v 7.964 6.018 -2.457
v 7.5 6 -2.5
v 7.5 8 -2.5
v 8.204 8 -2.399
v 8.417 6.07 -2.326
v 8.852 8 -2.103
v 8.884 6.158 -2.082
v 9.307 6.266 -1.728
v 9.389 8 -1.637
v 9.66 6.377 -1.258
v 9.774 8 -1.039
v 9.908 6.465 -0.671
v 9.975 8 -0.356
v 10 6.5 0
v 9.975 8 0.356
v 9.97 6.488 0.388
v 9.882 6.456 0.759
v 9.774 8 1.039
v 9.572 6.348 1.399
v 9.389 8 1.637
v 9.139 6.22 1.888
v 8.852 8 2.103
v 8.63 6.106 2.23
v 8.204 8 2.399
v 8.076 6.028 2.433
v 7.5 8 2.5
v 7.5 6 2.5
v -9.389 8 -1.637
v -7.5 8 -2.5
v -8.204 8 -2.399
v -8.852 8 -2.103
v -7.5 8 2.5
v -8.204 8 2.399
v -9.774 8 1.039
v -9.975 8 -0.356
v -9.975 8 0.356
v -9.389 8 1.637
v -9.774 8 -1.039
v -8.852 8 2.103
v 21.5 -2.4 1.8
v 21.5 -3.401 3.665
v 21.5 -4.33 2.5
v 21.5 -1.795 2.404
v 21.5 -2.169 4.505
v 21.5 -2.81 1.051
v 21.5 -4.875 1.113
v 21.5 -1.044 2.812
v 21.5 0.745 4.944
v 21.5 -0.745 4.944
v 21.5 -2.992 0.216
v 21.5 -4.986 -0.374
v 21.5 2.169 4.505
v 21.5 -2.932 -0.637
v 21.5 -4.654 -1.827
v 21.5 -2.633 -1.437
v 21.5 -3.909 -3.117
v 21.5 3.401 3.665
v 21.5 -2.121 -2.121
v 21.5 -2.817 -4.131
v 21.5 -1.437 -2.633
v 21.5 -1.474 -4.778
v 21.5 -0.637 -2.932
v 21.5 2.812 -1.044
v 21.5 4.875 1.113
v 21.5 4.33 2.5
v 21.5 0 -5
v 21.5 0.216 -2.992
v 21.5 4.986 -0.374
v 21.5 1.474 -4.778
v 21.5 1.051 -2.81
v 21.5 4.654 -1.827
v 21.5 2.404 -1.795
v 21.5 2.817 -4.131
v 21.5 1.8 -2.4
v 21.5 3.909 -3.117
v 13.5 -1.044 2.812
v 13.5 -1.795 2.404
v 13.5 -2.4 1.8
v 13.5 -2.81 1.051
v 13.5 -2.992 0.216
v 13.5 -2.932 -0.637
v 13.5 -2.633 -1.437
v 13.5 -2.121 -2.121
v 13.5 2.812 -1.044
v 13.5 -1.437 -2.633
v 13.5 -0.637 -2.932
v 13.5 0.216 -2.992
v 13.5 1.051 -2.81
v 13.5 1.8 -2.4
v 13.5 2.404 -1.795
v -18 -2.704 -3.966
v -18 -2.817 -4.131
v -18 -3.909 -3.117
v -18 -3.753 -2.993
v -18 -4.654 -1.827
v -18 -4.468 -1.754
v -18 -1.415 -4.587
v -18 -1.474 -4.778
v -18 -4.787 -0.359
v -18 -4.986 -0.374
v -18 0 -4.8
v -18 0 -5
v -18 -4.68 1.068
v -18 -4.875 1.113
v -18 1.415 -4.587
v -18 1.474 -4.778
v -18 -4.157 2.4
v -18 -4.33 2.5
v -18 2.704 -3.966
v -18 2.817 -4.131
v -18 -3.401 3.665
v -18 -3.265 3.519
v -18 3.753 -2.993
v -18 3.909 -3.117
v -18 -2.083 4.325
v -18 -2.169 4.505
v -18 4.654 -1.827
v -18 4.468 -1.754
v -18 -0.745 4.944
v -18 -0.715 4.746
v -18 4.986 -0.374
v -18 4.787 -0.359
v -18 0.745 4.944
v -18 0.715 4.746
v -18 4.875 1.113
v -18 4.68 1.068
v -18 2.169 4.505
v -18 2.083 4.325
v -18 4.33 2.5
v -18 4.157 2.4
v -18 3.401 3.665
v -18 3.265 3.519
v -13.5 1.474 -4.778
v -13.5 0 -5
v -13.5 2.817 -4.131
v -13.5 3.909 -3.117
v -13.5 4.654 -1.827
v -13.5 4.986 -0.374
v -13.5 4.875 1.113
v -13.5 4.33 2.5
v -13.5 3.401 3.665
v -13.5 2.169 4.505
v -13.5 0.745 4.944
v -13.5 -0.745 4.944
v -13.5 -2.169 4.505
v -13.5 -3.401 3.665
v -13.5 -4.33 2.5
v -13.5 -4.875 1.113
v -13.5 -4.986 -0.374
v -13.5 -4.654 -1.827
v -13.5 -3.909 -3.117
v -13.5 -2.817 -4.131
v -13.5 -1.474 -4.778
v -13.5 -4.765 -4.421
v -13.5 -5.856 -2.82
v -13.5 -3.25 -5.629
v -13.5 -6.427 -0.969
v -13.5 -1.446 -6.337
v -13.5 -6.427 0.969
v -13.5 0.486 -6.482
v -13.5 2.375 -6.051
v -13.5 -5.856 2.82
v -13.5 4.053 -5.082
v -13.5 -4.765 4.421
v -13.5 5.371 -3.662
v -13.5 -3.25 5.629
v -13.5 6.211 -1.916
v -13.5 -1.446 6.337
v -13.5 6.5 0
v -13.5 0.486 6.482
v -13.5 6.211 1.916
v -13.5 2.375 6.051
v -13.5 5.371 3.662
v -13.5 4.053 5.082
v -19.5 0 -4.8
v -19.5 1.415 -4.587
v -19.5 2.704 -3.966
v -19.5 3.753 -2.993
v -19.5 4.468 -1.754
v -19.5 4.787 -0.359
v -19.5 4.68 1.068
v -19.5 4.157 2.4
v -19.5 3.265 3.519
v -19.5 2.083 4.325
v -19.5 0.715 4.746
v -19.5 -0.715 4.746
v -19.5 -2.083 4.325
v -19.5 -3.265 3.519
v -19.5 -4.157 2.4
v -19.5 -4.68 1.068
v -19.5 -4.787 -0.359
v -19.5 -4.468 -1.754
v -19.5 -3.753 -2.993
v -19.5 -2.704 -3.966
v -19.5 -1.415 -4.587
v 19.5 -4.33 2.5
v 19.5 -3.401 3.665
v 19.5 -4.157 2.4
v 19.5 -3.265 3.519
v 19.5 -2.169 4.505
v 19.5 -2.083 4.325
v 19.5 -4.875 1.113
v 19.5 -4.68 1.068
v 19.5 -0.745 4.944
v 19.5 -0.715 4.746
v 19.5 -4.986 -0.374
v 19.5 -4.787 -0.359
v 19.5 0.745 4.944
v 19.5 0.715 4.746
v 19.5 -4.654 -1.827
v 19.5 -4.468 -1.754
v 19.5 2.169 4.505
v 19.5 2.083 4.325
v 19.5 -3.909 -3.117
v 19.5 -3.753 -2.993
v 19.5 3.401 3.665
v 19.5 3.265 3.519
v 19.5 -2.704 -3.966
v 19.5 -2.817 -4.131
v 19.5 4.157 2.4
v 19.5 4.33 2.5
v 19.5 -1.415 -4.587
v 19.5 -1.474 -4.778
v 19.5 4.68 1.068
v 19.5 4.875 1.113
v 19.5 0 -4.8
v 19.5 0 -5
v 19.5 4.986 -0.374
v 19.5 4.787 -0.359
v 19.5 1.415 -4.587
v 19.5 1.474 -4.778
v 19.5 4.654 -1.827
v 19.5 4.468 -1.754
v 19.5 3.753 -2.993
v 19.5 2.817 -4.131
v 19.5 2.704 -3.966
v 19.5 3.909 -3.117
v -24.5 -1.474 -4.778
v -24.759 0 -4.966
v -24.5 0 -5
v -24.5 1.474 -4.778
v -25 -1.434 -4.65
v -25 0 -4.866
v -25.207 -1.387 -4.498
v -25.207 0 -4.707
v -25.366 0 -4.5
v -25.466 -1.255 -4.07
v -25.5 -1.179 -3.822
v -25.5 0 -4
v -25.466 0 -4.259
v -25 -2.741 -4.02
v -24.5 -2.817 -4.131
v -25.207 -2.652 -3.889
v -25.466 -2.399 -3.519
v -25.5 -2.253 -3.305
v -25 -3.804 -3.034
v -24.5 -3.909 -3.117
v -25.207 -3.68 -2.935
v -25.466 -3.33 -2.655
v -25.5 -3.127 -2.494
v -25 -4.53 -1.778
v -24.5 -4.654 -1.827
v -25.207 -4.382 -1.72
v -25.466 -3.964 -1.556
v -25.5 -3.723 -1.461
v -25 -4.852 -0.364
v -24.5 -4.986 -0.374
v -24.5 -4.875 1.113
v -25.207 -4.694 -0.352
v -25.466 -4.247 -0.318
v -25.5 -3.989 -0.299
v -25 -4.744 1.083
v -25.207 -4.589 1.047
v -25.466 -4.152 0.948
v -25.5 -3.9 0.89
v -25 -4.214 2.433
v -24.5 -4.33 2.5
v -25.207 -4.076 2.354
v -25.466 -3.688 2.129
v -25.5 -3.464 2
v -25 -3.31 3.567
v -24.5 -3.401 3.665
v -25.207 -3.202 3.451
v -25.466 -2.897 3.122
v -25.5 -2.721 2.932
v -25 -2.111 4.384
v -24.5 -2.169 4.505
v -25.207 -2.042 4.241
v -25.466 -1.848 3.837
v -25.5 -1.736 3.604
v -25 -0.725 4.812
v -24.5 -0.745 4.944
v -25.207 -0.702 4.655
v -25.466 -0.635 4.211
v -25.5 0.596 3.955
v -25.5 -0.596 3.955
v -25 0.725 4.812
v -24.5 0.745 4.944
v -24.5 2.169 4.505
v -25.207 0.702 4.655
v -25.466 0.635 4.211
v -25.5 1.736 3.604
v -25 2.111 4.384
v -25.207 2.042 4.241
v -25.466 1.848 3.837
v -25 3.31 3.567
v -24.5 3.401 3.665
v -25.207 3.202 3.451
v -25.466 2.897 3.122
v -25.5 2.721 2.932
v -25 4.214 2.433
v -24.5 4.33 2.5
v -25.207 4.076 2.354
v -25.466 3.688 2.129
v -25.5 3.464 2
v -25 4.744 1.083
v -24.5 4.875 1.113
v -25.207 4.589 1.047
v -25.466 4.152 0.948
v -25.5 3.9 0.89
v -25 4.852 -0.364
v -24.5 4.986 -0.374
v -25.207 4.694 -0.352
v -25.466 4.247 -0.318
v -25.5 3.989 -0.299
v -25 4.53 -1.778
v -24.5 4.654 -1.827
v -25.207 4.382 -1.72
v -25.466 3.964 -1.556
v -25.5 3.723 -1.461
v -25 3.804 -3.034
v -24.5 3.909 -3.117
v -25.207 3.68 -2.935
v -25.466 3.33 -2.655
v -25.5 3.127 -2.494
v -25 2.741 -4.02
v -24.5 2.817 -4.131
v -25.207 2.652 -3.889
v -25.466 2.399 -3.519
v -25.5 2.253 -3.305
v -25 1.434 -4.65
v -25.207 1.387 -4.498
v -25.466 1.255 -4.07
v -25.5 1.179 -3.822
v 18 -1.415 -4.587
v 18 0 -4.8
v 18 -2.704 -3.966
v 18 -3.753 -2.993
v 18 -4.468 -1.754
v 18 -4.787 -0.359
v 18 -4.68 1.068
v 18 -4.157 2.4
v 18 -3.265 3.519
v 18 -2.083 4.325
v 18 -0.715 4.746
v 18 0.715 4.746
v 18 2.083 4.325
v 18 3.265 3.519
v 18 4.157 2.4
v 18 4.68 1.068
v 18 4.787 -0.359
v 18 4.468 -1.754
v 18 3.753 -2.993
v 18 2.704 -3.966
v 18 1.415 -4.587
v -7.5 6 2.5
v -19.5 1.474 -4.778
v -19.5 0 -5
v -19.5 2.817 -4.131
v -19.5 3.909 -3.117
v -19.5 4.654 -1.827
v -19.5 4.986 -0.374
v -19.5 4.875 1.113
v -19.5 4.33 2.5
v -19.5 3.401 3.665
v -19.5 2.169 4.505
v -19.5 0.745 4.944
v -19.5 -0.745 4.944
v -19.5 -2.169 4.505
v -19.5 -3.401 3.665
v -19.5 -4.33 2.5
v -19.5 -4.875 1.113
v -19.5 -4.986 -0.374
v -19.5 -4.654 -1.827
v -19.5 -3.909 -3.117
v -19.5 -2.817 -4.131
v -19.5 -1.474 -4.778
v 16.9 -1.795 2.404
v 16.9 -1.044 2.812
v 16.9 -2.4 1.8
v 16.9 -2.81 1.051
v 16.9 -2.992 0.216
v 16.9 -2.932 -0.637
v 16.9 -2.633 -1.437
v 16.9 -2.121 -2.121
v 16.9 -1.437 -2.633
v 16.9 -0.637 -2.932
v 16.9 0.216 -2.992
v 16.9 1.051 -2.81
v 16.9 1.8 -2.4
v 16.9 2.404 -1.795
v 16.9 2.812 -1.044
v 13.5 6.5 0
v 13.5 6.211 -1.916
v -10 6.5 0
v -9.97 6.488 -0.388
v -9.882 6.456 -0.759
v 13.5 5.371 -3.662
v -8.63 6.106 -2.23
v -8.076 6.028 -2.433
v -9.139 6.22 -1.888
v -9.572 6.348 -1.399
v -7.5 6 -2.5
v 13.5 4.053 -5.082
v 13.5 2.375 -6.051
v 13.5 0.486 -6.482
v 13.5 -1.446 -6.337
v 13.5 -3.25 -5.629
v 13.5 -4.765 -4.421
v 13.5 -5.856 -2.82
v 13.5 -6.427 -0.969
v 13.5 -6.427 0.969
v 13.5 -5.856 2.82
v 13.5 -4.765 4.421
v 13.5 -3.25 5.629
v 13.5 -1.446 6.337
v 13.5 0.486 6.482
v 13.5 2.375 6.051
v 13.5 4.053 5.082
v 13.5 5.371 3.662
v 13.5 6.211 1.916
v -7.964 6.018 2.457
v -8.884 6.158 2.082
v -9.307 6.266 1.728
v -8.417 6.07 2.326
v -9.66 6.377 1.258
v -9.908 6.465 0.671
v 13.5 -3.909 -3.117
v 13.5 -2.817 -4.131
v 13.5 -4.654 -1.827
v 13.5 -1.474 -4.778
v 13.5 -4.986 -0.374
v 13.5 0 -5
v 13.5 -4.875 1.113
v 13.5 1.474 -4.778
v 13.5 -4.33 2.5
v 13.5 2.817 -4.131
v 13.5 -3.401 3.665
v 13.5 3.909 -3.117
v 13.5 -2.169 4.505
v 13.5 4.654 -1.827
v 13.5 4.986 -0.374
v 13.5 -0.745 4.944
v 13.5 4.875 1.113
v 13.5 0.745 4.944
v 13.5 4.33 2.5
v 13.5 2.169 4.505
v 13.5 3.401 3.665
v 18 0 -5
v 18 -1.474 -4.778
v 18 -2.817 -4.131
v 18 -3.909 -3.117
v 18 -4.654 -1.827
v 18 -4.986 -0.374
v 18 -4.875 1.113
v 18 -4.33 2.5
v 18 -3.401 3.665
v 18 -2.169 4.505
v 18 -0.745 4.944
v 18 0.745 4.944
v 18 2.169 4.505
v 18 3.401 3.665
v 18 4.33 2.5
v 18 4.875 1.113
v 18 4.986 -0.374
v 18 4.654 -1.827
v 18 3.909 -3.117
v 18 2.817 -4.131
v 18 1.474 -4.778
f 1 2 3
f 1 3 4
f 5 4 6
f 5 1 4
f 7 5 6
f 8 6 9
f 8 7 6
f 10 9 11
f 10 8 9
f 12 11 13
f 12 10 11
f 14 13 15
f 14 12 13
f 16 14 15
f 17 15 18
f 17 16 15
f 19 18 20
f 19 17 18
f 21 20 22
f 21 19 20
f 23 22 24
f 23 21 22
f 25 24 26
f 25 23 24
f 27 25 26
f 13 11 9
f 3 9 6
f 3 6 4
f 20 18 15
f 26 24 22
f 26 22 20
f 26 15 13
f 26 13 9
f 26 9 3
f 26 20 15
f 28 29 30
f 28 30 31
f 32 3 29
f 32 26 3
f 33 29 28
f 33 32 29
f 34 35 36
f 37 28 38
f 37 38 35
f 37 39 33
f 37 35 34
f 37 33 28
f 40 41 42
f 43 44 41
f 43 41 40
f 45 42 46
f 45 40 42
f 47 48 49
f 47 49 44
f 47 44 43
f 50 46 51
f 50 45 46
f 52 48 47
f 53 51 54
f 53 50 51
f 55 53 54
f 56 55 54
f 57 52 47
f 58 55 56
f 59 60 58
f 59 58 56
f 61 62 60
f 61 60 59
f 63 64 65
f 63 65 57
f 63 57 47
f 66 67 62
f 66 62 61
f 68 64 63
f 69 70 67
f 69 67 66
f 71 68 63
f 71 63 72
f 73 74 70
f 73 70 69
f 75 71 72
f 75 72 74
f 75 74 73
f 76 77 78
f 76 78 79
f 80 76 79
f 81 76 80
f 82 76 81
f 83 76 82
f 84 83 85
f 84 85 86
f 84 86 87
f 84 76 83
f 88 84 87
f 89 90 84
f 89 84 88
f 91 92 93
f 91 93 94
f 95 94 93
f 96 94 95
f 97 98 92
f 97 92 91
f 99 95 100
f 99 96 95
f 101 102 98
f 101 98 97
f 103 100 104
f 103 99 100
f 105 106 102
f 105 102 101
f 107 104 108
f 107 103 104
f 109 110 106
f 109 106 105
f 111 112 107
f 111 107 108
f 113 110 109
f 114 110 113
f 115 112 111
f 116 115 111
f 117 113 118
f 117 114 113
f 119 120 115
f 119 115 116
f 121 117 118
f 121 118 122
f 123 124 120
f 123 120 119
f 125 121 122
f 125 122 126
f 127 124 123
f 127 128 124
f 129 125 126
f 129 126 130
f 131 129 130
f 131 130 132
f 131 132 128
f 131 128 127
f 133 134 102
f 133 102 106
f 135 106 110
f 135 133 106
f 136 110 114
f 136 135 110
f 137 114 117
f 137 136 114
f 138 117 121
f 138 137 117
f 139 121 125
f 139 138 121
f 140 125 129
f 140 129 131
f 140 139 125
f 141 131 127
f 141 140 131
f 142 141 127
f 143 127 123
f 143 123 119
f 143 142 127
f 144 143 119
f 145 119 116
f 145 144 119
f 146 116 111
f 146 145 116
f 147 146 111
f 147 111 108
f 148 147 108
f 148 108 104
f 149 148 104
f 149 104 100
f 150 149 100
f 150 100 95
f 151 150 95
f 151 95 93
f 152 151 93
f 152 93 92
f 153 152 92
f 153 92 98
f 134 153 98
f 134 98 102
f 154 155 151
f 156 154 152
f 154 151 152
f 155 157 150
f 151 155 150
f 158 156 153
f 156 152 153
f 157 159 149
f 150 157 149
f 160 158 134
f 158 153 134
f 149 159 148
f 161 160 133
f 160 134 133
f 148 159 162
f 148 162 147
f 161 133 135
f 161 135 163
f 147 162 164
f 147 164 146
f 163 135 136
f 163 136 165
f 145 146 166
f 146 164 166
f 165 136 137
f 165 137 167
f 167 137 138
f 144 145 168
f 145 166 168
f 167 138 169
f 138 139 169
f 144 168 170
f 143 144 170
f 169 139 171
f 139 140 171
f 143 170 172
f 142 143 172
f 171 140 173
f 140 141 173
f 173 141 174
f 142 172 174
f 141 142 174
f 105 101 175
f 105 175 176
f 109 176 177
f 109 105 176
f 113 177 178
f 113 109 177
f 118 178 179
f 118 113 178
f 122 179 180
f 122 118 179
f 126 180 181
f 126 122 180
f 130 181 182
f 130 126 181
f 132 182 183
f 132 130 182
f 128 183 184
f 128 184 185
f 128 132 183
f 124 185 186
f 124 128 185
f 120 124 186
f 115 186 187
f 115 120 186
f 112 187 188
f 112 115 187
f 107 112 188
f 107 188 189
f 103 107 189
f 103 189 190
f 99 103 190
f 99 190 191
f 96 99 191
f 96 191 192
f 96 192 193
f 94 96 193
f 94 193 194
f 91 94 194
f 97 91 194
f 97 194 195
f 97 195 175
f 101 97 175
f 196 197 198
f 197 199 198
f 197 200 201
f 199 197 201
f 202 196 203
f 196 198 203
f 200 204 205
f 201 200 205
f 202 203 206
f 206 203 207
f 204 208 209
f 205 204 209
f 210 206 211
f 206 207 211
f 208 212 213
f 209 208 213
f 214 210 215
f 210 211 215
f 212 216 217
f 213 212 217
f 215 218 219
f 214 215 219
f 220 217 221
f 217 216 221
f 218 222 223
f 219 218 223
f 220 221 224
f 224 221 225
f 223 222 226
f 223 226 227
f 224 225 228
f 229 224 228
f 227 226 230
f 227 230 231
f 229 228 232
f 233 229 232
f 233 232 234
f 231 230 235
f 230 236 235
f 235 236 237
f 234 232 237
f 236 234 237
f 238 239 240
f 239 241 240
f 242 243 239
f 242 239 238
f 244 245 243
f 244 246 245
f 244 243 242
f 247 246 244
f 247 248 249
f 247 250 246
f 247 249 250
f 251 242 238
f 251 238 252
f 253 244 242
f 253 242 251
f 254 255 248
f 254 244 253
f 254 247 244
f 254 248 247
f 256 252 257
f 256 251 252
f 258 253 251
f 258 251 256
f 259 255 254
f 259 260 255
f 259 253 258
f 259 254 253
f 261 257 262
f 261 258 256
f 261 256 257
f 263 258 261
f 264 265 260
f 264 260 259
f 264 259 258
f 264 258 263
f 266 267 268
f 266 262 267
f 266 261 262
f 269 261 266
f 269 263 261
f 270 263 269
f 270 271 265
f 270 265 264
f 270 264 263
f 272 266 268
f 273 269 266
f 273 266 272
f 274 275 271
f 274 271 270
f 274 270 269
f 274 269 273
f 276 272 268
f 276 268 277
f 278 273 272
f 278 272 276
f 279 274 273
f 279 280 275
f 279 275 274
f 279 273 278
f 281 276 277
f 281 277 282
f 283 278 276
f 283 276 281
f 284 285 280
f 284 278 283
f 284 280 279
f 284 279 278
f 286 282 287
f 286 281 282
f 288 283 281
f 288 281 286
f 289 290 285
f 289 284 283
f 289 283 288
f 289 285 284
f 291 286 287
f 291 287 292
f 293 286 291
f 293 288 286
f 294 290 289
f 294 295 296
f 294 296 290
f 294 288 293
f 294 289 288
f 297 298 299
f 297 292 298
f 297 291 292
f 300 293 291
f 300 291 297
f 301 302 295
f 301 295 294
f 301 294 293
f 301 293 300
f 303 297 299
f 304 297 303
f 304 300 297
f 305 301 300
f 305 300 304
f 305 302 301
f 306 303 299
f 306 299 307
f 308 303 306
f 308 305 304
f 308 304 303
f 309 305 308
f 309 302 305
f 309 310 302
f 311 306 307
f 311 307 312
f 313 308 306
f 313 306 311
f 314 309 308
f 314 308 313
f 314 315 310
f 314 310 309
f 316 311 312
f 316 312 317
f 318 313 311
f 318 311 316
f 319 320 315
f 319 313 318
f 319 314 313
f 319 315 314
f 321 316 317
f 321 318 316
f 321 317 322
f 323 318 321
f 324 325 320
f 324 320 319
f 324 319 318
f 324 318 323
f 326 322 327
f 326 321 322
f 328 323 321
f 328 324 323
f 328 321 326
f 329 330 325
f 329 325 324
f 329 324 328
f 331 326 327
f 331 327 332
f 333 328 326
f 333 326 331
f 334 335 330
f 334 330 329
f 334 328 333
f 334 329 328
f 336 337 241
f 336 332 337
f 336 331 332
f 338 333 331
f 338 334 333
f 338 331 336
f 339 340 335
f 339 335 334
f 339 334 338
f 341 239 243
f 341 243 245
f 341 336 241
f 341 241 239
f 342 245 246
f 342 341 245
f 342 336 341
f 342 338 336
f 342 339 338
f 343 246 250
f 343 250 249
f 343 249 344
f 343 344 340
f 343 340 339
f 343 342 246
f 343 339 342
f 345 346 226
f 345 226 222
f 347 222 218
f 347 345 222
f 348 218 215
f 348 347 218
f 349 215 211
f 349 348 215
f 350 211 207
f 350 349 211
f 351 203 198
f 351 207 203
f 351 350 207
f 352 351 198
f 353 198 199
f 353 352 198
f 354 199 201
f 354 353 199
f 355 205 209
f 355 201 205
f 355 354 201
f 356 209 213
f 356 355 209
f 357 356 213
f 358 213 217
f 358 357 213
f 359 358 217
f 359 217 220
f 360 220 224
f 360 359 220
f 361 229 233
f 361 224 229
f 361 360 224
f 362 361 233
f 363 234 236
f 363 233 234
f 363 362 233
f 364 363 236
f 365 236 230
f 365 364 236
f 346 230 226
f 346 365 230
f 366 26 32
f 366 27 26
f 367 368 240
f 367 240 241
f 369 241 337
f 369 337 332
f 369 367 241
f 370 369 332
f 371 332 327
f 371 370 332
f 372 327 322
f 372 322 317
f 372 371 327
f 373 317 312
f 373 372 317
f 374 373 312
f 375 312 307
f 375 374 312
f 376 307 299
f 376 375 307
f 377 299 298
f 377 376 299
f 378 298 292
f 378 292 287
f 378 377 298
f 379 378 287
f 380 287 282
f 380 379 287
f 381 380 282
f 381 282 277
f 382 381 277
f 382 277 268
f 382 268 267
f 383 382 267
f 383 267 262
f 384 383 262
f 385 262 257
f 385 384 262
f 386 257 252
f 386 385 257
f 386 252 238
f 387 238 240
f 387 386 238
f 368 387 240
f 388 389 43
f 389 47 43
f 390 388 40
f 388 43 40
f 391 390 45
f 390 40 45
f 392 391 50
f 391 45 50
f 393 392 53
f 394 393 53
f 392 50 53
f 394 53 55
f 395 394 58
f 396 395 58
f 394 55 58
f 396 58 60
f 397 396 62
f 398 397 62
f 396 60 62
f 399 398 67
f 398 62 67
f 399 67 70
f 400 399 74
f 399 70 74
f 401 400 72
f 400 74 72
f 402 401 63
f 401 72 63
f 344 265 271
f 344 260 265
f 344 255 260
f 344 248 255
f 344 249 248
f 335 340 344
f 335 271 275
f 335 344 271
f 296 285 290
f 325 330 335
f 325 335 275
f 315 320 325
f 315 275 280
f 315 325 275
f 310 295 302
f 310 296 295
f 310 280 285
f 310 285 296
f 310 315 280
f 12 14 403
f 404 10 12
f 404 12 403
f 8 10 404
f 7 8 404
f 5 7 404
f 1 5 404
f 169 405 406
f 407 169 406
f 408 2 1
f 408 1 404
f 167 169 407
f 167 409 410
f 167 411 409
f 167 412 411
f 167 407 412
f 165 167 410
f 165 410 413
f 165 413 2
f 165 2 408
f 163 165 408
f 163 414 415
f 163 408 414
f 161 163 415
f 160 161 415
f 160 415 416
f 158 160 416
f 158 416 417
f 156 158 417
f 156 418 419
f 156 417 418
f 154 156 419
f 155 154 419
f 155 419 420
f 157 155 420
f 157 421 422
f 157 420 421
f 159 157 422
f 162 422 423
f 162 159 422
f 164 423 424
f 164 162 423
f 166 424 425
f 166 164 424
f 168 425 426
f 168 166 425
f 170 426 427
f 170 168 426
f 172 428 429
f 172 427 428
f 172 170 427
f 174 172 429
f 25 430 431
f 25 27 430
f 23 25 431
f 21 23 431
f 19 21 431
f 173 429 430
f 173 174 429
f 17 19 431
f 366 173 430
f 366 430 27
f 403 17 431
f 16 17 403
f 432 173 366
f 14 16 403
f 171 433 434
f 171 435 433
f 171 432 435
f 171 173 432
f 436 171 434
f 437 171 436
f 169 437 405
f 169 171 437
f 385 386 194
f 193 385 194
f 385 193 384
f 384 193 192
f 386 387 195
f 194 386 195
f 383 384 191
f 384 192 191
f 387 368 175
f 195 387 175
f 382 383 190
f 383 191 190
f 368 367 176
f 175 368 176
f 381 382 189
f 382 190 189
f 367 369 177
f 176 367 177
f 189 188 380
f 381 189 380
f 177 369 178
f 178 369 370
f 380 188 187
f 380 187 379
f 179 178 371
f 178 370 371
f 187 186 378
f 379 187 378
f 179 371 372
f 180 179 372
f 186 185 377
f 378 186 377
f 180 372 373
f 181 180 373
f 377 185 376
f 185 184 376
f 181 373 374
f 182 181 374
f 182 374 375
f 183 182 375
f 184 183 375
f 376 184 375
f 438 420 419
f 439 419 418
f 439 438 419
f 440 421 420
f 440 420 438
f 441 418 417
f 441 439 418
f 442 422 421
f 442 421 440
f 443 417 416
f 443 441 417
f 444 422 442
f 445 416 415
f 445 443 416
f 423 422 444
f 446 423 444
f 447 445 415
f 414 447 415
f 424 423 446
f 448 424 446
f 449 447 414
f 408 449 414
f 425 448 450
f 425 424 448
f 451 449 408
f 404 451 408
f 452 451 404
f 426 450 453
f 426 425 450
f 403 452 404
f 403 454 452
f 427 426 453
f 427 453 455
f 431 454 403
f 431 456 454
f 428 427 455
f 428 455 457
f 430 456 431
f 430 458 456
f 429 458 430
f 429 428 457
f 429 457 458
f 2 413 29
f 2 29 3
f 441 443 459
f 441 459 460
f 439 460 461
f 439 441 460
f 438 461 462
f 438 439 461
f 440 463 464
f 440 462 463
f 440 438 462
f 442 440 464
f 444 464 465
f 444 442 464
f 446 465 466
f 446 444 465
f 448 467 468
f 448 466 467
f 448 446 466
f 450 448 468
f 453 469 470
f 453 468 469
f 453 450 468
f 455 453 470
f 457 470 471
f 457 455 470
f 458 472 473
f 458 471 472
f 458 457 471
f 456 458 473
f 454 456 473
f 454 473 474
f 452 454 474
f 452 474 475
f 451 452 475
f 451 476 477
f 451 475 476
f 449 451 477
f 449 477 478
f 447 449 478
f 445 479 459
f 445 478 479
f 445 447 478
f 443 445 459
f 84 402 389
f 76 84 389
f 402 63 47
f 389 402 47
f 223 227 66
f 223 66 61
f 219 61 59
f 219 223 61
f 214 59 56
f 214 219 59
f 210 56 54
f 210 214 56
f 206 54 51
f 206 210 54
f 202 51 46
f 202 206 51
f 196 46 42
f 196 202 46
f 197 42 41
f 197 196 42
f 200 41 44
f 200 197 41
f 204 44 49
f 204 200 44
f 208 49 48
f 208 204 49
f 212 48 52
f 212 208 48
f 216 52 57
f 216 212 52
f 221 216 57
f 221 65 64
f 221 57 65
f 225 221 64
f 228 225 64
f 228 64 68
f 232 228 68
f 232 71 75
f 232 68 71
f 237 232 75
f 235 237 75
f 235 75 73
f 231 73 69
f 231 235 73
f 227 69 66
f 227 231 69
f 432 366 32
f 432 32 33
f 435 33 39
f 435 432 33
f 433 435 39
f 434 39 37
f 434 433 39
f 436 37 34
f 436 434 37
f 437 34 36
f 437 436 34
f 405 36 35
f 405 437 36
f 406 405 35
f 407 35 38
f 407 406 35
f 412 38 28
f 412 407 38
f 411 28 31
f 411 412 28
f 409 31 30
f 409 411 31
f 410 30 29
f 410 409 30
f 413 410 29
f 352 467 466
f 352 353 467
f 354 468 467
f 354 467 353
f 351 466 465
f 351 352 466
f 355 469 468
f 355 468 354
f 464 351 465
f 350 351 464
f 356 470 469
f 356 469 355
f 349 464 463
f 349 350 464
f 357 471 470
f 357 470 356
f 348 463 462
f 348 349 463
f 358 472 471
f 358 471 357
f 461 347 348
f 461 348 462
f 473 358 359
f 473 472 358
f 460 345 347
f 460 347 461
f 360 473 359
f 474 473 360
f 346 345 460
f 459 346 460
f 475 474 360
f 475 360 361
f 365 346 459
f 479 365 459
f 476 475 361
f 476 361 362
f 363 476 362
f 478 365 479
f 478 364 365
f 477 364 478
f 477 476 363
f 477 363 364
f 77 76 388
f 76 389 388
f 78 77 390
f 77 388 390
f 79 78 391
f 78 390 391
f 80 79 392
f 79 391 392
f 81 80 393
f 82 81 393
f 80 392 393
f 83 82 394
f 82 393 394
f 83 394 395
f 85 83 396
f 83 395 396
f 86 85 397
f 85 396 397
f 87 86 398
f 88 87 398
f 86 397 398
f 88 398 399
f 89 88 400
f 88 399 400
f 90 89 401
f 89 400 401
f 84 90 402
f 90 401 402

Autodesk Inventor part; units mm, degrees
ref_plane "YZ Plane" through (0, 0, 0) normal (1, 0, 0) x (0, 1, 0)
ref_plane "XZ Plane" through (0, 0, 0) normal (0, 1, 0) x (-1, 0, 0)
sketch "Sketch1" plane through (0, 0, 0) normal (1, 0, 0) x (0, 1, 0)
  circle A0 centre (0, 0) radius 6.5
  dimension "d0" = 13
extrude "Extrusion1" add sketch "Sketch1" along normal mid plane 27
sketch "Sketch2" plane through (13.5, 0, 0) normal (1, 0, 0) x (0, 0, -1)
  circle A0 centre (0, 0) radius 5
  dimension "d3" = 10
extrude "Extrusion2" add sketch "Sketch2" along normal blind 12
ref_plane "Work Plane1" through (18, 0, 0) normal (1, 0, 0) x (0, 0, -1)
sketch "Sketch3" plane through (18, 0, 0) normal (1, 0, 0) x (0, 0, -1)
  circle A0 centre (0, 0) radius 4.8
  circle A1 centre (0, 0) radius 5 projected
  dimension "d8" = 9.6
extrude "Extrusion3" cut sketch "Sketch3" along normal blind 1.5
mirror "Mirror1" about plane through (0, 0, 0) normal (1, 0, 0) of "Extrusion2", "Extrusion3"
sketch "Sketch4" plane through (0, 0, 0) normal (0, 1, 0) x (-1, 0, 0)
  line L0 (7.5, 0) -> (-7.5, 0) construction
  line L1 (7.5, -2.5) -> (-7.5, -2.5)
  line L2 (-7.5, 2.5) -> (7.5, 2.5)
  arc A0 (7.5, -2.5) -> (7.5, 2.5) centre (7.5, 0) ccw
  arc A1 (-7.5, 2.5) -> (-7.5, -2.5) centre (-7.5, 0) ccw
  point P0 (0, 0)
  point P1 (0, 0)
  point P2 (10, 0)
  point P3 (-10, 0)
  dimension "d11" = 5
  dimension "d12" = 20
  dimension "d13" = 10
  dimension "d14" = 0
extrude "Extrusion4" add sketch "Sketch4" along normal blind 8
fillet "Fillet2" radius 1 1 edges at (-25.5, 0, 5)
sketch "Sketch6" plane through (25.5, 0, 0) normal (1, 0, 0) x (0, 0, -1)
  circle A0 centre (0, 0) radius 5 projected
extrude "Extrusion6" add sketch "Sketch6" along normal blind 2
sketch "Sketch8" plane through (27.5, 0, 0) normal (1, 0, 0) x (0, 0, -1)
  circle A0 centre (0, 0) radius 3
  line L0 (1.0445, 2.8123) -> (-2.8123, -1.0445)
  line L1 (-2.1213, -2.1213) -> (4.9809, 4.9809)
  line L2 (9.1, 0) -> (-9.1, 0) projected
  point P0 (-0.8839, 0.8839)
  dimension "d30" = 6
  dimension "d31" = 45
  dimension "d32" = 1.25
extrude "Extrusion8" cut sketch "Sketch8" against normal blind 10.6 contours L0 L2 L1 A0 | L1 L2 A0 | L0 A0 L1 L2 | L2 L1 A0
sketch "Sketch9" plane through (27.5, 0, 0) normal (1, 0, 0) x (0, 0, -1)
  arc A0 (-2.8123, -1.0445) -> (1.0445, 2.8123) centre (0, 0) ccw projected
  line L0 (-2.8123, -1.0445) -> (1.0445, 2.8123) projected
  circle A1 centre (0, 0) radius 5 projected
extrude "Extrusion9" cut sketch "Sketch9" against normal blind 4.6
sketch "Sketch10" plane through (22.9, 0, 0) normal (1, 0, 0) x (0, 0, -1)
  circle A0 centre (0, 0) radius 5 projected
  line L0 (1.0445, 2.8123) -> (-2.8123, -1.0445) projected
  arc A1 (-2.8123, -1.0445) -> (1.0445, 2.8123) centre (0, 0) ccw projected
extrude "Extrusion10" cut sketch "Sketch10" against normal blind 1.4
sketch "Sketch11" plane through (16.9, 0, 0) normal (1, 0, 0) x (0, 0, -1)
  line L0 (-2.8123, -1.0445) -> (1.0445, 2.8123) projected
  arc A0 (-2.8123, -1.0445) -> (1.0445, 2.8123) centre (0, 0) ccw projected
extrude "Extrusion11" cut sketch "Sketch11" against normal up to surface (3.4 mm away)
properties part number "Shaft between link2 and 3"
